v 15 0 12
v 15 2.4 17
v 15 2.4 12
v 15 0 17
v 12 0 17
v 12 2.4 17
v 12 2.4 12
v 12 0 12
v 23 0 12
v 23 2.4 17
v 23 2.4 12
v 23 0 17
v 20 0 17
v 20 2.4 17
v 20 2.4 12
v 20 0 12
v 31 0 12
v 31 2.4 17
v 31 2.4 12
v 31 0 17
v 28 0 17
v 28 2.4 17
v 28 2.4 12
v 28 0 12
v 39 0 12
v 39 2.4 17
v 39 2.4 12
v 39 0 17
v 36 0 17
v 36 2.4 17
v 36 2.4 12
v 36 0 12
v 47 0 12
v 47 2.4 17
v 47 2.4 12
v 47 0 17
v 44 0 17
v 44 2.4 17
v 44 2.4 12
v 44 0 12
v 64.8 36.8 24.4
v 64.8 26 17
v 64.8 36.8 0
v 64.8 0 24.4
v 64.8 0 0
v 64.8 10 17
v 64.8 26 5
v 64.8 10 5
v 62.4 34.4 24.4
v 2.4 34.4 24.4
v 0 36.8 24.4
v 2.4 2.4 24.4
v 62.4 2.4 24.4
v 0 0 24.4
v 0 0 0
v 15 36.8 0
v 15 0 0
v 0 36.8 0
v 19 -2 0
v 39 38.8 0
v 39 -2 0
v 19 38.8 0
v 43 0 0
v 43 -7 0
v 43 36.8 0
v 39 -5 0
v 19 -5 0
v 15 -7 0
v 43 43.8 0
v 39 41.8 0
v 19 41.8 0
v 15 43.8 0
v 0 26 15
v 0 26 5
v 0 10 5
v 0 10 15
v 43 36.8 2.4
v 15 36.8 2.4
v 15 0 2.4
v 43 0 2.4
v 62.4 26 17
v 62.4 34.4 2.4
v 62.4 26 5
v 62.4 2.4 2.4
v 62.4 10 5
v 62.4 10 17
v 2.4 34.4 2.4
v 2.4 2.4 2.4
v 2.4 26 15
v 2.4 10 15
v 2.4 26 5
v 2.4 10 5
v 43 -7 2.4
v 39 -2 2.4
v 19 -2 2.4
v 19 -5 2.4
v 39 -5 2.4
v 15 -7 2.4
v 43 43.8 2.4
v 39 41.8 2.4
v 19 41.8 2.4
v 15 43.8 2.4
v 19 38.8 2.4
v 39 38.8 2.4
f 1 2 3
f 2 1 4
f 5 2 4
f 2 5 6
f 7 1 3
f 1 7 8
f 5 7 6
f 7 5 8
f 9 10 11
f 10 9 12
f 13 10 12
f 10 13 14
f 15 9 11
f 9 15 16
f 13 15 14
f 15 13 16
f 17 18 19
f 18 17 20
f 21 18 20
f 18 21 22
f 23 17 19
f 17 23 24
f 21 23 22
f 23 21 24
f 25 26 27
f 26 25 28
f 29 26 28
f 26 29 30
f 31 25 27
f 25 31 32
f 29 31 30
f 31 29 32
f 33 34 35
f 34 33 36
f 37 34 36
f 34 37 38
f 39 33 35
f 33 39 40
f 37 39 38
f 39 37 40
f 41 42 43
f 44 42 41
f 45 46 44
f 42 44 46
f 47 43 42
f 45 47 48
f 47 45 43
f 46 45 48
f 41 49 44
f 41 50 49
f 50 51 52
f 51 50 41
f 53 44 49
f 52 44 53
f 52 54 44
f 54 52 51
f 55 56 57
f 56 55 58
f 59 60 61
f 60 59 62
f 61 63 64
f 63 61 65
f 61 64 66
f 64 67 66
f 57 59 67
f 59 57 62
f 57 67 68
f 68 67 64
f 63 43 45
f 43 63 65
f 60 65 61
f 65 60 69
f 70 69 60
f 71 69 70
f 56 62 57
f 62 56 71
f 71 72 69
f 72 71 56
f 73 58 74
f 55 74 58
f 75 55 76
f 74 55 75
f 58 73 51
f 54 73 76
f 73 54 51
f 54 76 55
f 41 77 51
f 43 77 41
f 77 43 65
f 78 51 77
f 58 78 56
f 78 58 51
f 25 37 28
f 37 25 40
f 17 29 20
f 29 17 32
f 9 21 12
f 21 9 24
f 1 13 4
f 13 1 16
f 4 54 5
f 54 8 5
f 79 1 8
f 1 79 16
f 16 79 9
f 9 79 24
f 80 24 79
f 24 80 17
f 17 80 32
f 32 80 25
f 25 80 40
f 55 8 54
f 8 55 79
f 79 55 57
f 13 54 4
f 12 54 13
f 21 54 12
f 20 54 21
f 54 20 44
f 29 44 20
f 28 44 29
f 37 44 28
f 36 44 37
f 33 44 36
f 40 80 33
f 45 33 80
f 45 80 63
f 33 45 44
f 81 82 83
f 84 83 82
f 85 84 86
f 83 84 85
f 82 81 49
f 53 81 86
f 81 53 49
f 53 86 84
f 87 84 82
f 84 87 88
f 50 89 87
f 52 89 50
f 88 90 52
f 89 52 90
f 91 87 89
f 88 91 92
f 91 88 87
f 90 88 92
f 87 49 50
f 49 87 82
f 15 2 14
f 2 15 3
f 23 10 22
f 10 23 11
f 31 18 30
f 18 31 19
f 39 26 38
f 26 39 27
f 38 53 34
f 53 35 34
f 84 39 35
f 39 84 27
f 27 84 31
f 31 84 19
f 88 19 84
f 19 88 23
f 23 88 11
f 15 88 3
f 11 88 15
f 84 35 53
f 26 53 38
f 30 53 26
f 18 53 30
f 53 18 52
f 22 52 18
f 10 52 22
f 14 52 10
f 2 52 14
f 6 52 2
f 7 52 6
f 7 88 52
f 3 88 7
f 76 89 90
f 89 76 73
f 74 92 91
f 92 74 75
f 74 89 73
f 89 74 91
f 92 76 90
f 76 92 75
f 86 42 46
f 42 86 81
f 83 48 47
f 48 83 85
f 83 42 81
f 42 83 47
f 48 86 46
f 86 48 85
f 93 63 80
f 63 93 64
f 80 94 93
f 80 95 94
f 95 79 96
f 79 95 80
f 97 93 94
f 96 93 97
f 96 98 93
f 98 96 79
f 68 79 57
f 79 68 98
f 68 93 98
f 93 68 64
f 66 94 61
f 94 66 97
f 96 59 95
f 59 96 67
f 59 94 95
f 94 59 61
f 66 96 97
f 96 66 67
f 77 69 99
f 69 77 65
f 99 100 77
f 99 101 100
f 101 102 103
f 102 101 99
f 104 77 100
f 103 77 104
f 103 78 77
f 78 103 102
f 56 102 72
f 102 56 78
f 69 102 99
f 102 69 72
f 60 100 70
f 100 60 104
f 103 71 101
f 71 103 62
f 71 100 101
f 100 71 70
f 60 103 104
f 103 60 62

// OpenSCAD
// Editable prototype enclosure. Measure your ESP32 board before printing.
// Board mounting uses foam/Velcro; no invented board-hole dimensions.
$fn=48;
inside_length=60;
inside_width=32;
inside_height=22;
wall=2.4;
strap_width=20;
part="base"; // "base", "lid" or "both"

module base(){
  difference(){
    cube([inside_length+2*wall,inside_width+2*wall,inside_height+wall]);
    translate([wall,wall,wall]) cube([inside_length,inside_width,inside_height+1]);
    // USB and detachable glove harness openings; confirm placement on your board.
    translate([-1,10,5]) cube([wall+2,16,10]);
    translate([inside_length+wall,10,5]) cube([wall+2,16,12]);
    // Side ventilation; no battery cell inside the first USB-powered prototype.
    for(x=[12:8:48]) translate([x,-1,12]) cube([3,wall+2,5]);
  }
  for(y=[-7,inside_width+2*wall]){
    difference(){
      translate([15,y,0]) cube([strap_width+8,7,wall]);
      translate([19,y+2,-1]) cube([strap_width,3,wall+2]);
    }
  }
}
module lid(){
  difference(){
    union(){
      cube([inside_length+2*wall,inside_width+2*wall,wall]);
      translate([wall+.35,wall+.35,wall]) cube([inside_length-.7,inside_width-.7,2]);
    }
    translate([wall+2,wall+2,wall-.1]) cube([inside_length-4,inside_width-4,3]);
    for(x=[12:8:48]) translate([x,12,-1]) cube([3,12,wall+2]);
  }
}
if(part=="base" || part=="both") base();
if(part=="lid") lid();
if(part=="both") translate([0,inside_width+25,0]) lid();
